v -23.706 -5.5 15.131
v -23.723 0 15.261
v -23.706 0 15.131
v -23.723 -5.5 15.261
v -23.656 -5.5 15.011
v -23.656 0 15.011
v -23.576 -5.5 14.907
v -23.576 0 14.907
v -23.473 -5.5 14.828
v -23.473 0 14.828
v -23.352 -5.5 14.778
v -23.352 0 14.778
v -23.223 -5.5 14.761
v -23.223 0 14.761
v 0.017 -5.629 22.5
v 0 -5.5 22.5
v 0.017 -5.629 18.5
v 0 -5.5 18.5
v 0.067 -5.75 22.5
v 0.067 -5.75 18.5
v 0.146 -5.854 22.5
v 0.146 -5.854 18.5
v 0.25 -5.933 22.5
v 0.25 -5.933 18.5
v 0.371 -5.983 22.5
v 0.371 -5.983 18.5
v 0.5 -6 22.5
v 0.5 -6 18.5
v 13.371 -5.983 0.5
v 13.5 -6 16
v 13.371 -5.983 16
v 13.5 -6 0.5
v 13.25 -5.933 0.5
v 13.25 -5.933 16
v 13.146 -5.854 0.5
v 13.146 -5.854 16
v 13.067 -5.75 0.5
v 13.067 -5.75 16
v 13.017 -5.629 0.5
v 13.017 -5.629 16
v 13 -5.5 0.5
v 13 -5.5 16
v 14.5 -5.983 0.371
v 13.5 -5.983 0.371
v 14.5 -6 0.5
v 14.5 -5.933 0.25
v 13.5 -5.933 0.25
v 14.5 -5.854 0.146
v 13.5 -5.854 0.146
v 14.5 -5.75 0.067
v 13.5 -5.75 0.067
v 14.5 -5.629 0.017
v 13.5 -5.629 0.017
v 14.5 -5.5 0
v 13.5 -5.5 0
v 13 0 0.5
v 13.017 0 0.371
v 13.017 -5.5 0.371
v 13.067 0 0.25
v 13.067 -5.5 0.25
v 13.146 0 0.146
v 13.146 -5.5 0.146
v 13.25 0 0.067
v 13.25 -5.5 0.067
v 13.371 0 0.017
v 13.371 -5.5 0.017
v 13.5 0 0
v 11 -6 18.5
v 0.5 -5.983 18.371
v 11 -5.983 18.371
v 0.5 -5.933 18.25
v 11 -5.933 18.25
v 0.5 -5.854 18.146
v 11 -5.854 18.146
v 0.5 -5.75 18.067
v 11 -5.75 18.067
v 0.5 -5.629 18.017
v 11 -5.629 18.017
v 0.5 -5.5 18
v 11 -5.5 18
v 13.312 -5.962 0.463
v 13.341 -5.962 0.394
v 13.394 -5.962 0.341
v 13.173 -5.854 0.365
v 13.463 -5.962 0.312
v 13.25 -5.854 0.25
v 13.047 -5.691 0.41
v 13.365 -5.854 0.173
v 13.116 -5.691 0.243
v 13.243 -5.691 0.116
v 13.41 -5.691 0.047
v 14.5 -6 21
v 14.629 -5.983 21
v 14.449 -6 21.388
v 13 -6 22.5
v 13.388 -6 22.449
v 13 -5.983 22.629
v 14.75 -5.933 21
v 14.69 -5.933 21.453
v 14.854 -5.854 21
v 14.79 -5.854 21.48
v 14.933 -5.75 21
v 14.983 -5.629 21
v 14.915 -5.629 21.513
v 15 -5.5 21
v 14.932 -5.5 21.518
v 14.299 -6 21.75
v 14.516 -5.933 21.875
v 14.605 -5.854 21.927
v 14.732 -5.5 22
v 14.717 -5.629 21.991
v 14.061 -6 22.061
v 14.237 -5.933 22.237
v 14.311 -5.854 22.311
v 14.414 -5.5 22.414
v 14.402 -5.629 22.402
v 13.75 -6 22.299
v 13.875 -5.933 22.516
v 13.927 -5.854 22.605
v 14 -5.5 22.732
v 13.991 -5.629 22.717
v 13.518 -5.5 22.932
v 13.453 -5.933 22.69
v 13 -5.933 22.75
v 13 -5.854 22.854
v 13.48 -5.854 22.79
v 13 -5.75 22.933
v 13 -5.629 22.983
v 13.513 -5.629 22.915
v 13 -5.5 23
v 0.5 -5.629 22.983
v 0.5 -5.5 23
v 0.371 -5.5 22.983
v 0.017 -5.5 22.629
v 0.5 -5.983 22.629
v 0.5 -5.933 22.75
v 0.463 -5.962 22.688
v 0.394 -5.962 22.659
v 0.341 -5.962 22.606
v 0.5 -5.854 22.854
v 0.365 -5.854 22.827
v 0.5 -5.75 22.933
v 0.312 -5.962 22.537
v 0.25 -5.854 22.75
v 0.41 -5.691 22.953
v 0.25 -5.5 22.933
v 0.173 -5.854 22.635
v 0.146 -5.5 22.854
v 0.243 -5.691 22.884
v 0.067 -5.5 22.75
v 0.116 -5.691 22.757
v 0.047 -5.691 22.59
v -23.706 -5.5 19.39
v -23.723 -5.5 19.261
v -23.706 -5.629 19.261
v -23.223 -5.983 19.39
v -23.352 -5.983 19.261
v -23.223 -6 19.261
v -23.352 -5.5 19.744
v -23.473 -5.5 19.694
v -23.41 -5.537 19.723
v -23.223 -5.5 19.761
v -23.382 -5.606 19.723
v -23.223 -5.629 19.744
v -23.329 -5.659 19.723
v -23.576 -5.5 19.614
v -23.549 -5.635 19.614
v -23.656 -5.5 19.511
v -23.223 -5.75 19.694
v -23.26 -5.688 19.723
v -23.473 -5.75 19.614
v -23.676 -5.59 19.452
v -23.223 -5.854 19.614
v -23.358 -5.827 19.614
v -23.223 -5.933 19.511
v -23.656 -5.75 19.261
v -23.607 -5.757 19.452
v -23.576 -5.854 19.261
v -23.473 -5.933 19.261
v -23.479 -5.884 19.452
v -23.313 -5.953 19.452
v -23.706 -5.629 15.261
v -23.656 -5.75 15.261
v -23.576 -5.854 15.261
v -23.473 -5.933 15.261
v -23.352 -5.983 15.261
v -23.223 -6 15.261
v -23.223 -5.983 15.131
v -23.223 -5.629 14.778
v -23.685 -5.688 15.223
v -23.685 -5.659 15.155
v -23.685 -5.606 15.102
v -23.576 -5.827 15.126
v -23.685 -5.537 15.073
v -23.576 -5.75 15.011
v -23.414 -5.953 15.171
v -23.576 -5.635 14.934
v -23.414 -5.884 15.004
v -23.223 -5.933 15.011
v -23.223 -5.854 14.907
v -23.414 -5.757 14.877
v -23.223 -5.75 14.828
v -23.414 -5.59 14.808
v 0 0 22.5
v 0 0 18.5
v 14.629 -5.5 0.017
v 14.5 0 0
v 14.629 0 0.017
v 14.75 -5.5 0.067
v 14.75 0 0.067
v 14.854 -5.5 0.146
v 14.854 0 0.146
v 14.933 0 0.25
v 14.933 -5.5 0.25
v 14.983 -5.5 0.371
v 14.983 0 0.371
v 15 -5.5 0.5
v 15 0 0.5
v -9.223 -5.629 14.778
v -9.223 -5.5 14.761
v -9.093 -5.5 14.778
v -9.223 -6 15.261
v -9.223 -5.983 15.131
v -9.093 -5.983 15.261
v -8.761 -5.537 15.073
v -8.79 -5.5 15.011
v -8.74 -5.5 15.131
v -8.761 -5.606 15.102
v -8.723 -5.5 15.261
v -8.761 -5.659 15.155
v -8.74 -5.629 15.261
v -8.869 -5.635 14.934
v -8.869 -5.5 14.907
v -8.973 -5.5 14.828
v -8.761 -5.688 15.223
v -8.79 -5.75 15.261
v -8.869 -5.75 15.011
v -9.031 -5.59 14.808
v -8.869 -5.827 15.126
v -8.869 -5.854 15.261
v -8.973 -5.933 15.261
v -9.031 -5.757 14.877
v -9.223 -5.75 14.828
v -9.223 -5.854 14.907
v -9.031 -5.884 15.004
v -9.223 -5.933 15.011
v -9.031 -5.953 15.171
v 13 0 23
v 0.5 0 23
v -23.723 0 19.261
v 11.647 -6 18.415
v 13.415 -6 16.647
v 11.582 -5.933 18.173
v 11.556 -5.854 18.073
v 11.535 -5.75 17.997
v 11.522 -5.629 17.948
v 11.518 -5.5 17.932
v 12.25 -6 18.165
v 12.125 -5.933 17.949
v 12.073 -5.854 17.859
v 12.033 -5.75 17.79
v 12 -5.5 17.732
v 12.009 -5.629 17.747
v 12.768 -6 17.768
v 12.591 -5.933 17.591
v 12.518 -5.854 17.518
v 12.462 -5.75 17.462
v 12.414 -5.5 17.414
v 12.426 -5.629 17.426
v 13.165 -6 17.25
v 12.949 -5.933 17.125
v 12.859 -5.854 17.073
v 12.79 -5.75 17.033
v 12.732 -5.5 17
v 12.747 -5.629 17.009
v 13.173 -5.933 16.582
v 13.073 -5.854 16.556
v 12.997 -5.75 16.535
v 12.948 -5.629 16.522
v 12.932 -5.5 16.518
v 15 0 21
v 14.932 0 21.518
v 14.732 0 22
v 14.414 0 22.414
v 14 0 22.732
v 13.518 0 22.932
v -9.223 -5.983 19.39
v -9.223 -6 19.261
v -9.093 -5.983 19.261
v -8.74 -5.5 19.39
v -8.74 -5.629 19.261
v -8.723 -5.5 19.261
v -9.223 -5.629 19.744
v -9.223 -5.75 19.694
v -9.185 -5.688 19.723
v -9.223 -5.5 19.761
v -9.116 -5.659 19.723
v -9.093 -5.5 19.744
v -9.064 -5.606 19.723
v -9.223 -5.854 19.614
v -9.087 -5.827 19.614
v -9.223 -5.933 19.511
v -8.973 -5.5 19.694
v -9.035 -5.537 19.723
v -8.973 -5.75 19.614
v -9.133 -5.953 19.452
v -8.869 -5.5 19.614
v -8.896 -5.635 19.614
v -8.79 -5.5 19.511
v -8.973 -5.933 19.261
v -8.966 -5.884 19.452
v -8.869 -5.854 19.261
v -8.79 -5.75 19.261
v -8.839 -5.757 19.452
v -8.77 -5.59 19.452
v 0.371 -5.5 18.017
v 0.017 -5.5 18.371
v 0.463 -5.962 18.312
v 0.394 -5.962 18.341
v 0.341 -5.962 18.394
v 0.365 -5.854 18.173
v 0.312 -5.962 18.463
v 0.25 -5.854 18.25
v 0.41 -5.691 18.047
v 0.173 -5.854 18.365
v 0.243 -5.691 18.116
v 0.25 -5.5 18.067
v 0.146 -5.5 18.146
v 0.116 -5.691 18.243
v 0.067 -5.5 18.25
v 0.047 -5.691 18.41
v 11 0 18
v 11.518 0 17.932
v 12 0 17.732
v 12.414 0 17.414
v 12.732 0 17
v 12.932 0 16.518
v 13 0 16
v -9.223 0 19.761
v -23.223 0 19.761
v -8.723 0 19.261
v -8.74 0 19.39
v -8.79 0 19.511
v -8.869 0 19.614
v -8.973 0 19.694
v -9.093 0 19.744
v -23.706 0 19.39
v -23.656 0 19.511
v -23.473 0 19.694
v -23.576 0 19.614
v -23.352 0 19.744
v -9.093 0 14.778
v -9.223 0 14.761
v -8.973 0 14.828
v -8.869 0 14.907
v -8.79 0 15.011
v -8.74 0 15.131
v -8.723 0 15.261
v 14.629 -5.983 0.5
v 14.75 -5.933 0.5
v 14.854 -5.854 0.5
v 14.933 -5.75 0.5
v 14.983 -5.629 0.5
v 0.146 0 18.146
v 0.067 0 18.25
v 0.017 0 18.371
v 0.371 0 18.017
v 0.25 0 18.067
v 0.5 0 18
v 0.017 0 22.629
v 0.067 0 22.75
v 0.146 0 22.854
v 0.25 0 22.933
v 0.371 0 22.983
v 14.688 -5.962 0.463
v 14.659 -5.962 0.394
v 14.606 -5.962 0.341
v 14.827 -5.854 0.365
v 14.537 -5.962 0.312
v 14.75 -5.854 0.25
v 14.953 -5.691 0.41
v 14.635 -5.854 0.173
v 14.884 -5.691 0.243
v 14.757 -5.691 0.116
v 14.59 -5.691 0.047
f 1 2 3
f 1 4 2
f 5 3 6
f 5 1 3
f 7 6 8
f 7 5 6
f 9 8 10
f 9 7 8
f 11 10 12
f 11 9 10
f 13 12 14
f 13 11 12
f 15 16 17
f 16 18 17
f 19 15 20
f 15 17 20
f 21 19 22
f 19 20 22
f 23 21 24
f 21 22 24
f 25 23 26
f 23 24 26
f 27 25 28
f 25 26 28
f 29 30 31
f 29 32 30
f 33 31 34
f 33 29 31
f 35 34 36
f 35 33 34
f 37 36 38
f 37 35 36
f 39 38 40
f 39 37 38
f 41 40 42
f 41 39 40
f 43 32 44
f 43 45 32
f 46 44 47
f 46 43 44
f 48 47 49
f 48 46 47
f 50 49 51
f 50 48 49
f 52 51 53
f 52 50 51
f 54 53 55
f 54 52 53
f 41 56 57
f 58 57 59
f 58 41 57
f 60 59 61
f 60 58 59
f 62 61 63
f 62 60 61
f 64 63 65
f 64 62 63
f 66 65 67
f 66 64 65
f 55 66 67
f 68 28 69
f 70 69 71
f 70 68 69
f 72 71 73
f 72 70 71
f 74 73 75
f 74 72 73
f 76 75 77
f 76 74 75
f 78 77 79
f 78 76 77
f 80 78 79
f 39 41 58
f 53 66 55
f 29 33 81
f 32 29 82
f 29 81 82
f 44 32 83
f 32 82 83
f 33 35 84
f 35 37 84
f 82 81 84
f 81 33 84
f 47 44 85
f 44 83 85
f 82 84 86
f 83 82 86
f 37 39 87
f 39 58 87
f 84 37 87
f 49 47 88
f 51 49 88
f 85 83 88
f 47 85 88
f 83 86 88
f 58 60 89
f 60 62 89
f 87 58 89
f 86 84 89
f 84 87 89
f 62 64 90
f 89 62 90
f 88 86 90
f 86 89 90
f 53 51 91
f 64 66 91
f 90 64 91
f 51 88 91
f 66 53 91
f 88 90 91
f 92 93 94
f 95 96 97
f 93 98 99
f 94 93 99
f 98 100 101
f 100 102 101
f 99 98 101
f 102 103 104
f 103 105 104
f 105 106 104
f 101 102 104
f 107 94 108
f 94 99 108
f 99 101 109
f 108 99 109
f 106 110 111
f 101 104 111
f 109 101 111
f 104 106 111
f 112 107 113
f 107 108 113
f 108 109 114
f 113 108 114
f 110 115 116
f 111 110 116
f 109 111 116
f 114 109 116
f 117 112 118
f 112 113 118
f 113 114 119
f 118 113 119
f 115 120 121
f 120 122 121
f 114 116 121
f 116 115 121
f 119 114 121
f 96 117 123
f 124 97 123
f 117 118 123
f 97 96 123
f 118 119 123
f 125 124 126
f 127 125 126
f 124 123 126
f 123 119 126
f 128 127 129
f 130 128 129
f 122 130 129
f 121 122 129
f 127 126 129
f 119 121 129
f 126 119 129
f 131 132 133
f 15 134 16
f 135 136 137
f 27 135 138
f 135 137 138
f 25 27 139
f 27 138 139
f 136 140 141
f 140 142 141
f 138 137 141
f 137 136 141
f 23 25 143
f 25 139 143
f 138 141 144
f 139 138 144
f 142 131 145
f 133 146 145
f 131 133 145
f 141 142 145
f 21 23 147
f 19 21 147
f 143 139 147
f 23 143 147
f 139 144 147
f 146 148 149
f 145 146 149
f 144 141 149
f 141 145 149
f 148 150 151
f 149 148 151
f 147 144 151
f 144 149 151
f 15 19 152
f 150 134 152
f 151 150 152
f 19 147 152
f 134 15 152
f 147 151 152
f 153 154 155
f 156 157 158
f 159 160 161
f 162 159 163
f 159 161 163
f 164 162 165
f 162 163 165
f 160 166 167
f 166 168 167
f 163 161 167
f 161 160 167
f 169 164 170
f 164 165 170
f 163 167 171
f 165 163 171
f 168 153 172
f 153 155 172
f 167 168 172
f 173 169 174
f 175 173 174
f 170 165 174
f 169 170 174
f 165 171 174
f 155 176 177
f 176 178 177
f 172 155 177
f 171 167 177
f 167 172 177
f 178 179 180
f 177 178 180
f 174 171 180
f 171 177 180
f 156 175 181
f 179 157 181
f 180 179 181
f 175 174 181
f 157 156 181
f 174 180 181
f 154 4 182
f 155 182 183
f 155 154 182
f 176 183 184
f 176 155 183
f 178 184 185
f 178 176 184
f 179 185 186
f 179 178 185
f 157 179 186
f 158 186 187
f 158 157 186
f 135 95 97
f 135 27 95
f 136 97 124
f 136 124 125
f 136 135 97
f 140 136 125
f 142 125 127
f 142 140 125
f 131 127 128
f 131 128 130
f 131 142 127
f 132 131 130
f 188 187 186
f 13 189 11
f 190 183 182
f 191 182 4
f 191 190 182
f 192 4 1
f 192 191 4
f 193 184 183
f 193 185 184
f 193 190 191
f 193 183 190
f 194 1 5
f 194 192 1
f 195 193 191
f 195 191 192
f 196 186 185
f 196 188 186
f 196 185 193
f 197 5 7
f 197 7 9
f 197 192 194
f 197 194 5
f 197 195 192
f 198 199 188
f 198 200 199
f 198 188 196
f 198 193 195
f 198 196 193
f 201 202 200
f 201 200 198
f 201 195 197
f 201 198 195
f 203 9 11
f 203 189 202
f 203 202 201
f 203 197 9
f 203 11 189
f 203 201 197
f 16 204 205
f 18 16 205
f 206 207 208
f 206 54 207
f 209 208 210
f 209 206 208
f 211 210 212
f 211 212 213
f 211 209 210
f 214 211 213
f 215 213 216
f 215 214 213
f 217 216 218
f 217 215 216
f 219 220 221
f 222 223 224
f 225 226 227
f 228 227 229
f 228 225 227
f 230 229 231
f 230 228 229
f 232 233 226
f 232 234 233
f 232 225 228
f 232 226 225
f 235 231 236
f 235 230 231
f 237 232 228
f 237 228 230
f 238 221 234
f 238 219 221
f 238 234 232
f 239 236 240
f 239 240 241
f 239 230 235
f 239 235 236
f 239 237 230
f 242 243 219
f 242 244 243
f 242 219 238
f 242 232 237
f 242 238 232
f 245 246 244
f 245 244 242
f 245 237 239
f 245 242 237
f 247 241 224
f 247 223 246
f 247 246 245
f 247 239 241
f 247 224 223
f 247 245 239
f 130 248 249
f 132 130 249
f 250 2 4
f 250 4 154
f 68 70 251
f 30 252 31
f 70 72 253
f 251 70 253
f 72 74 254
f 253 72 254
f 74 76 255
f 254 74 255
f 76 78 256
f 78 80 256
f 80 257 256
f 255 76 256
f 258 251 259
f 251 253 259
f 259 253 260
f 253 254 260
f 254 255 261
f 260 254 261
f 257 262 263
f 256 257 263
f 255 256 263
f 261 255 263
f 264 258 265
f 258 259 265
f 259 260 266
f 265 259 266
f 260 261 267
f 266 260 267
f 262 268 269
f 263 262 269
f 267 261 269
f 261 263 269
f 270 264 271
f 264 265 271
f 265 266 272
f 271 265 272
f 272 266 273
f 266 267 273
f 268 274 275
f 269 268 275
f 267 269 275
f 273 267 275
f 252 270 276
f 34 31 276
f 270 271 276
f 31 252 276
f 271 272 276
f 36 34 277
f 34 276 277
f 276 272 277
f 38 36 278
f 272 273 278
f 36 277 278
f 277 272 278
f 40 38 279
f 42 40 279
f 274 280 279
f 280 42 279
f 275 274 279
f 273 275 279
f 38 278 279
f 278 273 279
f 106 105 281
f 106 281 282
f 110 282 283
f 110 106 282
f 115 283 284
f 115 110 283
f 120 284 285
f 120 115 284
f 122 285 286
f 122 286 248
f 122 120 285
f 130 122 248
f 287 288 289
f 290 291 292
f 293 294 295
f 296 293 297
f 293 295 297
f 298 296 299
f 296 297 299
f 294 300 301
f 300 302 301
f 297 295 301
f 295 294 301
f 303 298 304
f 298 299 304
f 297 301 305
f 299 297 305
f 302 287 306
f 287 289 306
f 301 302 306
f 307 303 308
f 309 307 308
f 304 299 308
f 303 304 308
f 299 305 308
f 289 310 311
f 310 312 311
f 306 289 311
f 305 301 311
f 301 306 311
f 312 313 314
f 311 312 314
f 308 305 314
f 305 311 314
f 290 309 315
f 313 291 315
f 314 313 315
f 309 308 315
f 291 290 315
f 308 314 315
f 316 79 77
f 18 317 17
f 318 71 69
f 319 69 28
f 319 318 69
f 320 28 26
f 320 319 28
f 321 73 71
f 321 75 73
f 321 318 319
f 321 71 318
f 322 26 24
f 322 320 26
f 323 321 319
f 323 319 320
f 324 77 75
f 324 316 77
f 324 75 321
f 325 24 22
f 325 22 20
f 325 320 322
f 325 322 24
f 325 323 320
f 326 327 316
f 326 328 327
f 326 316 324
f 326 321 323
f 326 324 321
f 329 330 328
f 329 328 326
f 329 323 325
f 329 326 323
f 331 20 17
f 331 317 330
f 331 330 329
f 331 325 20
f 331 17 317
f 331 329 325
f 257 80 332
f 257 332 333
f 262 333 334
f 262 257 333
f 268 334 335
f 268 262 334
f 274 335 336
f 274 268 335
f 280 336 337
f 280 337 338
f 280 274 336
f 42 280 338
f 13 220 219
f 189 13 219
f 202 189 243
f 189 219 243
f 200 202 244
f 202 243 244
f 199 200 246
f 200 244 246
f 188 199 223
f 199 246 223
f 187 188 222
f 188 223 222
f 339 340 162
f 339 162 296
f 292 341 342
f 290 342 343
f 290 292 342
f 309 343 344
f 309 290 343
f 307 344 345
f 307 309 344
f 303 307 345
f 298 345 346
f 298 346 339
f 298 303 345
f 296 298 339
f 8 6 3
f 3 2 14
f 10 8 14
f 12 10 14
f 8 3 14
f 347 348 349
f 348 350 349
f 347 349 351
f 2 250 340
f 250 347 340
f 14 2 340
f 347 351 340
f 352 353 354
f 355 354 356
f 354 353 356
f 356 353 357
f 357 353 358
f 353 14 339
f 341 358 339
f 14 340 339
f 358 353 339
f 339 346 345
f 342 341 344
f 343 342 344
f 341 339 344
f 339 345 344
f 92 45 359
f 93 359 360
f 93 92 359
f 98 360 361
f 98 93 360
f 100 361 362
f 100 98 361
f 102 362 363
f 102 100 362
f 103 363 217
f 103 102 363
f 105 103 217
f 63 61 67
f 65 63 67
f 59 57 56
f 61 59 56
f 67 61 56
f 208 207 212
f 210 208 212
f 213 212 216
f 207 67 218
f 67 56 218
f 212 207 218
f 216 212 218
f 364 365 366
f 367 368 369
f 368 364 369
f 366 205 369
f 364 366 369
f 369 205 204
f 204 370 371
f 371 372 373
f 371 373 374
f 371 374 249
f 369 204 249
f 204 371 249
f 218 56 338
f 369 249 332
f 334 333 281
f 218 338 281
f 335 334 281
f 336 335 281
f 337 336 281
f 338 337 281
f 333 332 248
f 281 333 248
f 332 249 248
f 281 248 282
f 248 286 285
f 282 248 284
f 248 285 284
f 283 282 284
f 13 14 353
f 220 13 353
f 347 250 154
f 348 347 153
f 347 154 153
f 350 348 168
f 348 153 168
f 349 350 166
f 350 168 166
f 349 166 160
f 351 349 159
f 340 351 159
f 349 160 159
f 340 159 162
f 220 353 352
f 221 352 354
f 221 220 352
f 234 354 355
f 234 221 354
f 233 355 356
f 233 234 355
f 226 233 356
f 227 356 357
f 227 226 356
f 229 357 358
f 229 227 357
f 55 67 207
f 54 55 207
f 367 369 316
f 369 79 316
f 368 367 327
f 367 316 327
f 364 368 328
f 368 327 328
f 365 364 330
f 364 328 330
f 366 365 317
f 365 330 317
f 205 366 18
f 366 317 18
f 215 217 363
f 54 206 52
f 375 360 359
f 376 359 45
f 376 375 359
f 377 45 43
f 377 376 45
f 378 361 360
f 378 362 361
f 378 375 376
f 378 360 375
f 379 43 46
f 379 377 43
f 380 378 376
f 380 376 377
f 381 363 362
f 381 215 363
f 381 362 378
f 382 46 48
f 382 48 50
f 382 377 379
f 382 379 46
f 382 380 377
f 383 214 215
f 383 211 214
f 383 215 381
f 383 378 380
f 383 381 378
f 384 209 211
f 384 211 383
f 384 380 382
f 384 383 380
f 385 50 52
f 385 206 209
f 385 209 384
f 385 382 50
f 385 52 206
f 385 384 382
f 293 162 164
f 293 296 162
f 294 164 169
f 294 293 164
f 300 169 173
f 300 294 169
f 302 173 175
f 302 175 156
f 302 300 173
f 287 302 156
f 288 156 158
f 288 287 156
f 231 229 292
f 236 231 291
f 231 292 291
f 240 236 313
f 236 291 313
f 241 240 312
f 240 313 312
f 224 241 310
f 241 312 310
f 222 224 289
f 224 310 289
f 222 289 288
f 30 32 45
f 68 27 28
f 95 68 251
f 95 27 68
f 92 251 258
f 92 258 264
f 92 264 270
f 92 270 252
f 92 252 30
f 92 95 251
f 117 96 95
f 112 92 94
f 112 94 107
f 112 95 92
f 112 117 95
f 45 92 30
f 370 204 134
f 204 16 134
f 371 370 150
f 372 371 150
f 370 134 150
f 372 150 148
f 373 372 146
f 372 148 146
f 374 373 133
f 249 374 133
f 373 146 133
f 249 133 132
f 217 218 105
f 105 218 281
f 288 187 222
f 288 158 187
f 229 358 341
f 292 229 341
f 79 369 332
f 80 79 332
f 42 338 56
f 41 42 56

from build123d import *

# Parameters (mm, degrees)
F0_W     = 15
F0_H     = 5
F1_DEPTH = 6
F2_R     = 2
F3_R     = 0.5


with BuildPart() as f1:
    # F0 (on Front) → F1 (new body)
    with BuildSketch(Plane.XZ):
        Polygon((0, 23), (0, 18), (13, 18), (13, 0), (15, 0), (15, 23), align=None)
        with Locations((-16.222784, 17.260809)):
            Rectangle(F0_W, F0_H)
    extrude(amount=F1_DEPTH)

    # F2
    f2_edges = [f1.edges().sort_by_distance(p)[0] for p in [
        (15, -3, 23),
        (13, -3, 18),
    ]]
    fillet(f2_edges, radius=F2_R)

    # F3
    f3_edges = [f1.edges().sort_by_distance(p)[0] for p in [
        (0, -3, 23),
        (0, -3, 18),
        (13, -3, 0),
        (15, -3, 0),
        (13, -6, 8),
        (15, -6, 10.5),
        (-16.222784, -6, 14.760809),
        (-23.722784, -6, 17.260809),
        (-23.722784, -3, 14.760809),
        (-23.722784, -3, 19.760809),
        (-8.722784, -3, 14.760809),
        (-8.722784, -6, 17.260809),
        (-16.222784, -6, 19.760809),
        (-8.722784, -3, 19.760809),
        (0, -6, 20.5),
        (14, -6, 0),
    ]]
    fillet(f3_edges, radius=F3_R)


solid = f1.part
